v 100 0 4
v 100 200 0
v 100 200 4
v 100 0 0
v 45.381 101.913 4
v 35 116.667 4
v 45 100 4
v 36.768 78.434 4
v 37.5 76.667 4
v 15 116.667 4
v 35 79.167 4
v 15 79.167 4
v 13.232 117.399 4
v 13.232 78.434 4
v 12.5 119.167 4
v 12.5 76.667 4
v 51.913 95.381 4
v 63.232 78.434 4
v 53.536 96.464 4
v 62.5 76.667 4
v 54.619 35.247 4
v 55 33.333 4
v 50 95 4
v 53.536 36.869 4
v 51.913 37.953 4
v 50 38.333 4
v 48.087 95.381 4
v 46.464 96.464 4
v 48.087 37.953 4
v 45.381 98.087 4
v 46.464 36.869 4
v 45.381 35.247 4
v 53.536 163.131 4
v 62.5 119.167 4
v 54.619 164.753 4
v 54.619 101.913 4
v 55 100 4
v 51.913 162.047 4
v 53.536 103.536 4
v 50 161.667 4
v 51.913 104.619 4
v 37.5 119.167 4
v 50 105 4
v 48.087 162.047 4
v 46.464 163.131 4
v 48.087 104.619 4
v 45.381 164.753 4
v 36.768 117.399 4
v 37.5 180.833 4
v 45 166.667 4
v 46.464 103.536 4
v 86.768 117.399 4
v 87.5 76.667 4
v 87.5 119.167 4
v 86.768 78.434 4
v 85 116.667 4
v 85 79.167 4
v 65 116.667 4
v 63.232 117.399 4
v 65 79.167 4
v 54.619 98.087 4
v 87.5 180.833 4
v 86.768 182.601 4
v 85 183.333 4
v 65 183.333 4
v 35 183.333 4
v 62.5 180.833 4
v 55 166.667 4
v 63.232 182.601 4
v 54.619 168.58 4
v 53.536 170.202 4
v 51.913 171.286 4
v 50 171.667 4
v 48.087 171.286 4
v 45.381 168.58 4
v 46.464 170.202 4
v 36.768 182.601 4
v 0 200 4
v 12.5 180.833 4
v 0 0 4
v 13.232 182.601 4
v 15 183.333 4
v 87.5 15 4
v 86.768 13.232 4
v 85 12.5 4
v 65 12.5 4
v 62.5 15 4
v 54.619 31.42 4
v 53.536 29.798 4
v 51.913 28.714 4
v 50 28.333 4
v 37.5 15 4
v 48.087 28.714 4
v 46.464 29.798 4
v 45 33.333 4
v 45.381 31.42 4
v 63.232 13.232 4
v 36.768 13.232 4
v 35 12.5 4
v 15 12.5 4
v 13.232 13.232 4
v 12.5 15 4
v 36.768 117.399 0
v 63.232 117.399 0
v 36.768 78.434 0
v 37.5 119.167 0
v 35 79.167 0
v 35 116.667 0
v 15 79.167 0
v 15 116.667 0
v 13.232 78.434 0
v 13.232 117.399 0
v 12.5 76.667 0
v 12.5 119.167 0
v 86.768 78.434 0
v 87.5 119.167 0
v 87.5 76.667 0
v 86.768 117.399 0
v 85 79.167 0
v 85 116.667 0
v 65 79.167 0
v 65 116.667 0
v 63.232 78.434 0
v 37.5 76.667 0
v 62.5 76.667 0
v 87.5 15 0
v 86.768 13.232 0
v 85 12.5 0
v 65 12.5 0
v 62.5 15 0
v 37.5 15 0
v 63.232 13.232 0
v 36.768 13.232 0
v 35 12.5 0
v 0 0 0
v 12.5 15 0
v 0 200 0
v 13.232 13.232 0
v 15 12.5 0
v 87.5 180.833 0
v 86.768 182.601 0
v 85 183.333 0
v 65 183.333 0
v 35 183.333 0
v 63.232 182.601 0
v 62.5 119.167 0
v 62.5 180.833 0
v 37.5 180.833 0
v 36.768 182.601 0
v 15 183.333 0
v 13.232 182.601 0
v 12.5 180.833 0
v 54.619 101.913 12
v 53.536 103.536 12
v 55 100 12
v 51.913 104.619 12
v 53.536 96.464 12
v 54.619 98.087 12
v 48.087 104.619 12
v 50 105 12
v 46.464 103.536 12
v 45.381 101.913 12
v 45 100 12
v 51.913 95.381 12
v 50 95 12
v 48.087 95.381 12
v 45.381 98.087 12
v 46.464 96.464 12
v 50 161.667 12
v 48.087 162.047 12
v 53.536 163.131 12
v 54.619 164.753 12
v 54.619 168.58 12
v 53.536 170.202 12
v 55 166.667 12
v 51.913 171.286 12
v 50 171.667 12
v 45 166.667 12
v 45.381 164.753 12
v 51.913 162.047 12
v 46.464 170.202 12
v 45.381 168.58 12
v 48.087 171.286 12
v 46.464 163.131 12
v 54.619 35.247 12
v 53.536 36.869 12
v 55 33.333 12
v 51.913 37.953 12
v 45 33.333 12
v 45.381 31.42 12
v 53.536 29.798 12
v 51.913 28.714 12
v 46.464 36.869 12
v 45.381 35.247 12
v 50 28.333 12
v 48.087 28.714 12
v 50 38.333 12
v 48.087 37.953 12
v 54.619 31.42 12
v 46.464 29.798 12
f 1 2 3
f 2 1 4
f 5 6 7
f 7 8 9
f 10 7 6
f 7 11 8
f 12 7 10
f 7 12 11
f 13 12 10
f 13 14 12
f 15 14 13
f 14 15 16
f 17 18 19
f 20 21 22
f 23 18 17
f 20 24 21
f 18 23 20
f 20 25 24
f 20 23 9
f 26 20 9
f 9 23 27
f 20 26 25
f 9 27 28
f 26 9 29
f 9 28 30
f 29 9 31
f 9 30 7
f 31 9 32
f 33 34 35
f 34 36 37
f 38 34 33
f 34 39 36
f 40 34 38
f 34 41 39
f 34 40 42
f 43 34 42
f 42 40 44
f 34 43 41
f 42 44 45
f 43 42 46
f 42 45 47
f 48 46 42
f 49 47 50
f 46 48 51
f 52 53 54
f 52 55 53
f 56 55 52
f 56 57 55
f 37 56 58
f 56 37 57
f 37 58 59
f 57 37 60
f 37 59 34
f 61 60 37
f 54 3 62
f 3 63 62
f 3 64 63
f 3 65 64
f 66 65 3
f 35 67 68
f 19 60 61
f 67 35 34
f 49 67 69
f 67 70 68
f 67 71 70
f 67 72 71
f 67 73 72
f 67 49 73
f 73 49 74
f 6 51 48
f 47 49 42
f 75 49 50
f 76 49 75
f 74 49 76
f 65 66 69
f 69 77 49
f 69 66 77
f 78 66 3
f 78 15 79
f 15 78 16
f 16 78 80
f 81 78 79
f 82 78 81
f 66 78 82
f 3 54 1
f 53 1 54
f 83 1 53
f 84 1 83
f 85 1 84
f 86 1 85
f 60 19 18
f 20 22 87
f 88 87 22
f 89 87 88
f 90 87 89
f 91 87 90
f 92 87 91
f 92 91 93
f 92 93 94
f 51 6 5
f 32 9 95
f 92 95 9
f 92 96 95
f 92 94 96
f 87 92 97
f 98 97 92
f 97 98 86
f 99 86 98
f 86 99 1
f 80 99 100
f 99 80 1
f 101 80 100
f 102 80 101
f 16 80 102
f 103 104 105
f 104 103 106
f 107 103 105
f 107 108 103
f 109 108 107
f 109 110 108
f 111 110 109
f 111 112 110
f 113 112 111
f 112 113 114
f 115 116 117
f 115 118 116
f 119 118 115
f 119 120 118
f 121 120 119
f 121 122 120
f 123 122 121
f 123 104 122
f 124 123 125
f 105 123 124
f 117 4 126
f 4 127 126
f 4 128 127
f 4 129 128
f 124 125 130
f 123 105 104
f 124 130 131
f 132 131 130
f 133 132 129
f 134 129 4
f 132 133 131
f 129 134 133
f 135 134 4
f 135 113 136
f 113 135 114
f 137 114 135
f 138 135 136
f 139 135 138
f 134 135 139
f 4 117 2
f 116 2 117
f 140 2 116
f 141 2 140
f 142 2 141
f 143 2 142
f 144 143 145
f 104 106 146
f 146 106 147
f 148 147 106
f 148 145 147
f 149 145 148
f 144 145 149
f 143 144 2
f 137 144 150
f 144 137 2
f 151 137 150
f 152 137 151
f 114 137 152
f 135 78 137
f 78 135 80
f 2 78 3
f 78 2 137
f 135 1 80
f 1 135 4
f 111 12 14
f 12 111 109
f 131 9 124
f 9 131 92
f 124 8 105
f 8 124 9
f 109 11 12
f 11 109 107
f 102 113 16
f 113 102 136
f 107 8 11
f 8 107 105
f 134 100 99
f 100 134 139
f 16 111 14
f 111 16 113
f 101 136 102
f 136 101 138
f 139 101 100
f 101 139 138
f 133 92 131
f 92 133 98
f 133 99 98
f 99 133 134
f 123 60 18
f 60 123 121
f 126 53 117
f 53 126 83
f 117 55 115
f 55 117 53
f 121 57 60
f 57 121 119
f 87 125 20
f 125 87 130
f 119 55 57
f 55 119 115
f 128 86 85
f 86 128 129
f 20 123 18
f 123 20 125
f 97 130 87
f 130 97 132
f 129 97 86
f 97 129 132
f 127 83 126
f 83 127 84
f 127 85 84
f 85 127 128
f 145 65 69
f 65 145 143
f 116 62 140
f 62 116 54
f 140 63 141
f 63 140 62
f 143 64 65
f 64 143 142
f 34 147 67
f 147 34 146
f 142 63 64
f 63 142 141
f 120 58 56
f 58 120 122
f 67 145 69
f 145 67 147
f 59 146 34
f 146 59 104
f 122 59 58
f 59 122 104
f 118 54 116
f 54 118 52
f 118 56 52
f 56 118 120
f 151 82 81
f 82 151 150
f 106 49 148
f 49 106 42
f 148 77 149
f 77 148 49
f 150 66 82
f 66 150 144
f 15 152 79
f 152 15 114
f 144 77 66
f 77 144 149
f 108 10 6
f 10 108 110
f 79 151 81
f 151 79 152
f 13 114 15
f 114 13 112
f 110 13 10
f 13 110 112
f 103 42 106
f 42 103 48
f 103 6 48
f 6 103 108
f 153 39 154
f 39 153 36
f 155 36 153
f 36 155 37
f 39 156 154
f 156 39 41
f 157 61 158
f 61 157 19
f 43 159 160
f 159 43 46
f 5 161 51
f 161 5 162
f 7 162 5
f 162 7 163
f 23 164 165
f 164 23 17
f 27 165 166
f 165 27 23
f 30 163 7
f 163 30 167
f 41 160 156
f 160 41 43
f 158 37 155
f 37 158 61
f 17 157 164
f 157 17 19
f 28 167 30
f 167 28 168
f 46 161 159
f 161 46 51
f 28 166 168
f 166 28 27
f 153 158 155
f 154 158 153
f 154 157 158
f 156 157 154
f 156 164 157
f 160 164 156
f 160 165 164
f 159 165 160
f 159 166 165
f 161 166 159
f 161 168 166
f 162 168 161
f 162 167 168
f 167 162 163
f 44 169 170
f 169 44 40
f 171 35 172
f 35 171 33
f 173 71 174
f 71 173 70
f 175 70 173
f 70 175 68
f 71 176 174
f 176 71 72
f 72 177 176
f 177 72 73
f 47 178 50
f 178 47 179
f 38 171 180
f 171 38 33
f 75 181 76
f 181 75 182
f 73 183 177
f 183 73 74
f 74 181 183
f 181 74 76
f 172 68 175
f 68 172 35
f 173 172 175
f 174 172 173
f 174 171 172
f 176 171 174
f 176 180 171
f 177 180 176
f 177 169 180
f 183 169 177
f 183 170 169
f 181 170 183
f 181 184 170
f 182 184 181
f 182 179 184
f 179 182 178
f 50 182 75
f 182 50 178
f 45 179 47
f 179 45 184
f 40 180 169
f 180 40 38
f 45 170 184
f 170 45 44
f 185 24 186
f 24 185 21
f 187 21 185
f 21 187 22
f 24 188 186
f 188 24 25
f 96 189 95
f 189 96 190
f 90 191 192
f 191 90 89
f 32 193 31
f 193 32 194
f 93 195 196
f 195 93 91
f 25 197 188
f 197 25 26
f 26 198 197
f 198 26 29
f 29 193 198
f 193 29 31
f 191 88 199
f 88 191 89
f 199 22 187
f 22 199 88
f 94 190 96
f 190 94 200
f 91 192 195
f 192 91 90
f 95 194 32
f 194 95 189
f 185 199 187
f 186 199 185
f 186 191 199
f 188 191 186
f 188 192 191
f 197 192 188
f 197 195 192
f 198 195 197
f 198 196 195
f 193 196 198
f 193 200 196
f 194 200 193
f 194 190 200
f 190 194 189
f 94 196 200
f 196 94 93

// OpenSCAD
width = 100;
height = width*2;
baseThickness = 4;
pegHeight = 8;
pegRadius = 5;
padding = width/12;
holeWidth = 3*padding;
holeHeight = width-4*padding;
holeCornerRadius = 2.5;

// from https://gist.github.com/tinkerology/ae257c5340a33ee2f149ff3ae97d9826
module roundedcube(xx, yy, height, radius, center=false, centerxy=false)
{
    translate([(center||centerxy)?-xx/2:0,(center||centerxy)?-yy/2:0,center?0:height/2])
    hull()
    {
        translate([radius,radius,0])
        cylinder(height,radius,radius,true);

        translate([xx-radius,radius,0])
        cylinder(height,radius,radius,true);

        translate([xx-radius,yy-radius,0])
        cylinder(height,radius,radius,true);

        translate([radius,yy-radius,0])
        cylinder(height,radius,radius,true);
    }
}

       
difference() {
    cube([width, height, baseThickness]);
    translate([padding*1.5, padding*1.5, 0]) {
        roundedcube(holeWidth, holeHeight, baseThickness, holeCornerRadius);                
    }   
    translate([width-padding*4.5, padding*1.5, 0]) {
        roundedcube(holeWidth, holeHeight, baseThickness, holeCornerRadius);                
    } 
    translate([width-padding*4.5, height-padding*10 ,0]) {
        roundedcube(holeWidth, holeHeight, baseThickness, holeCornerRadius);                
    } 
    translate([width-padding*10.5, height-padding*10, 0]) {
        roundedcube(holeWidth, holeHeight, baseThickness, holeCornerRadius);                
    } 
}

translate([width/2, height/2, baseThickness]) {
    cylinder(h=pegHeight, r=pegRadius);
}
translate([width/2, height-padding*4, baseThickness]) {
    cylinder(h=pegHeight, r=pegRadius);
}
translate([width/2, padding*4, baseThickness]) {
    cylinder(h=pegHeight, r=pegRadius);
}
